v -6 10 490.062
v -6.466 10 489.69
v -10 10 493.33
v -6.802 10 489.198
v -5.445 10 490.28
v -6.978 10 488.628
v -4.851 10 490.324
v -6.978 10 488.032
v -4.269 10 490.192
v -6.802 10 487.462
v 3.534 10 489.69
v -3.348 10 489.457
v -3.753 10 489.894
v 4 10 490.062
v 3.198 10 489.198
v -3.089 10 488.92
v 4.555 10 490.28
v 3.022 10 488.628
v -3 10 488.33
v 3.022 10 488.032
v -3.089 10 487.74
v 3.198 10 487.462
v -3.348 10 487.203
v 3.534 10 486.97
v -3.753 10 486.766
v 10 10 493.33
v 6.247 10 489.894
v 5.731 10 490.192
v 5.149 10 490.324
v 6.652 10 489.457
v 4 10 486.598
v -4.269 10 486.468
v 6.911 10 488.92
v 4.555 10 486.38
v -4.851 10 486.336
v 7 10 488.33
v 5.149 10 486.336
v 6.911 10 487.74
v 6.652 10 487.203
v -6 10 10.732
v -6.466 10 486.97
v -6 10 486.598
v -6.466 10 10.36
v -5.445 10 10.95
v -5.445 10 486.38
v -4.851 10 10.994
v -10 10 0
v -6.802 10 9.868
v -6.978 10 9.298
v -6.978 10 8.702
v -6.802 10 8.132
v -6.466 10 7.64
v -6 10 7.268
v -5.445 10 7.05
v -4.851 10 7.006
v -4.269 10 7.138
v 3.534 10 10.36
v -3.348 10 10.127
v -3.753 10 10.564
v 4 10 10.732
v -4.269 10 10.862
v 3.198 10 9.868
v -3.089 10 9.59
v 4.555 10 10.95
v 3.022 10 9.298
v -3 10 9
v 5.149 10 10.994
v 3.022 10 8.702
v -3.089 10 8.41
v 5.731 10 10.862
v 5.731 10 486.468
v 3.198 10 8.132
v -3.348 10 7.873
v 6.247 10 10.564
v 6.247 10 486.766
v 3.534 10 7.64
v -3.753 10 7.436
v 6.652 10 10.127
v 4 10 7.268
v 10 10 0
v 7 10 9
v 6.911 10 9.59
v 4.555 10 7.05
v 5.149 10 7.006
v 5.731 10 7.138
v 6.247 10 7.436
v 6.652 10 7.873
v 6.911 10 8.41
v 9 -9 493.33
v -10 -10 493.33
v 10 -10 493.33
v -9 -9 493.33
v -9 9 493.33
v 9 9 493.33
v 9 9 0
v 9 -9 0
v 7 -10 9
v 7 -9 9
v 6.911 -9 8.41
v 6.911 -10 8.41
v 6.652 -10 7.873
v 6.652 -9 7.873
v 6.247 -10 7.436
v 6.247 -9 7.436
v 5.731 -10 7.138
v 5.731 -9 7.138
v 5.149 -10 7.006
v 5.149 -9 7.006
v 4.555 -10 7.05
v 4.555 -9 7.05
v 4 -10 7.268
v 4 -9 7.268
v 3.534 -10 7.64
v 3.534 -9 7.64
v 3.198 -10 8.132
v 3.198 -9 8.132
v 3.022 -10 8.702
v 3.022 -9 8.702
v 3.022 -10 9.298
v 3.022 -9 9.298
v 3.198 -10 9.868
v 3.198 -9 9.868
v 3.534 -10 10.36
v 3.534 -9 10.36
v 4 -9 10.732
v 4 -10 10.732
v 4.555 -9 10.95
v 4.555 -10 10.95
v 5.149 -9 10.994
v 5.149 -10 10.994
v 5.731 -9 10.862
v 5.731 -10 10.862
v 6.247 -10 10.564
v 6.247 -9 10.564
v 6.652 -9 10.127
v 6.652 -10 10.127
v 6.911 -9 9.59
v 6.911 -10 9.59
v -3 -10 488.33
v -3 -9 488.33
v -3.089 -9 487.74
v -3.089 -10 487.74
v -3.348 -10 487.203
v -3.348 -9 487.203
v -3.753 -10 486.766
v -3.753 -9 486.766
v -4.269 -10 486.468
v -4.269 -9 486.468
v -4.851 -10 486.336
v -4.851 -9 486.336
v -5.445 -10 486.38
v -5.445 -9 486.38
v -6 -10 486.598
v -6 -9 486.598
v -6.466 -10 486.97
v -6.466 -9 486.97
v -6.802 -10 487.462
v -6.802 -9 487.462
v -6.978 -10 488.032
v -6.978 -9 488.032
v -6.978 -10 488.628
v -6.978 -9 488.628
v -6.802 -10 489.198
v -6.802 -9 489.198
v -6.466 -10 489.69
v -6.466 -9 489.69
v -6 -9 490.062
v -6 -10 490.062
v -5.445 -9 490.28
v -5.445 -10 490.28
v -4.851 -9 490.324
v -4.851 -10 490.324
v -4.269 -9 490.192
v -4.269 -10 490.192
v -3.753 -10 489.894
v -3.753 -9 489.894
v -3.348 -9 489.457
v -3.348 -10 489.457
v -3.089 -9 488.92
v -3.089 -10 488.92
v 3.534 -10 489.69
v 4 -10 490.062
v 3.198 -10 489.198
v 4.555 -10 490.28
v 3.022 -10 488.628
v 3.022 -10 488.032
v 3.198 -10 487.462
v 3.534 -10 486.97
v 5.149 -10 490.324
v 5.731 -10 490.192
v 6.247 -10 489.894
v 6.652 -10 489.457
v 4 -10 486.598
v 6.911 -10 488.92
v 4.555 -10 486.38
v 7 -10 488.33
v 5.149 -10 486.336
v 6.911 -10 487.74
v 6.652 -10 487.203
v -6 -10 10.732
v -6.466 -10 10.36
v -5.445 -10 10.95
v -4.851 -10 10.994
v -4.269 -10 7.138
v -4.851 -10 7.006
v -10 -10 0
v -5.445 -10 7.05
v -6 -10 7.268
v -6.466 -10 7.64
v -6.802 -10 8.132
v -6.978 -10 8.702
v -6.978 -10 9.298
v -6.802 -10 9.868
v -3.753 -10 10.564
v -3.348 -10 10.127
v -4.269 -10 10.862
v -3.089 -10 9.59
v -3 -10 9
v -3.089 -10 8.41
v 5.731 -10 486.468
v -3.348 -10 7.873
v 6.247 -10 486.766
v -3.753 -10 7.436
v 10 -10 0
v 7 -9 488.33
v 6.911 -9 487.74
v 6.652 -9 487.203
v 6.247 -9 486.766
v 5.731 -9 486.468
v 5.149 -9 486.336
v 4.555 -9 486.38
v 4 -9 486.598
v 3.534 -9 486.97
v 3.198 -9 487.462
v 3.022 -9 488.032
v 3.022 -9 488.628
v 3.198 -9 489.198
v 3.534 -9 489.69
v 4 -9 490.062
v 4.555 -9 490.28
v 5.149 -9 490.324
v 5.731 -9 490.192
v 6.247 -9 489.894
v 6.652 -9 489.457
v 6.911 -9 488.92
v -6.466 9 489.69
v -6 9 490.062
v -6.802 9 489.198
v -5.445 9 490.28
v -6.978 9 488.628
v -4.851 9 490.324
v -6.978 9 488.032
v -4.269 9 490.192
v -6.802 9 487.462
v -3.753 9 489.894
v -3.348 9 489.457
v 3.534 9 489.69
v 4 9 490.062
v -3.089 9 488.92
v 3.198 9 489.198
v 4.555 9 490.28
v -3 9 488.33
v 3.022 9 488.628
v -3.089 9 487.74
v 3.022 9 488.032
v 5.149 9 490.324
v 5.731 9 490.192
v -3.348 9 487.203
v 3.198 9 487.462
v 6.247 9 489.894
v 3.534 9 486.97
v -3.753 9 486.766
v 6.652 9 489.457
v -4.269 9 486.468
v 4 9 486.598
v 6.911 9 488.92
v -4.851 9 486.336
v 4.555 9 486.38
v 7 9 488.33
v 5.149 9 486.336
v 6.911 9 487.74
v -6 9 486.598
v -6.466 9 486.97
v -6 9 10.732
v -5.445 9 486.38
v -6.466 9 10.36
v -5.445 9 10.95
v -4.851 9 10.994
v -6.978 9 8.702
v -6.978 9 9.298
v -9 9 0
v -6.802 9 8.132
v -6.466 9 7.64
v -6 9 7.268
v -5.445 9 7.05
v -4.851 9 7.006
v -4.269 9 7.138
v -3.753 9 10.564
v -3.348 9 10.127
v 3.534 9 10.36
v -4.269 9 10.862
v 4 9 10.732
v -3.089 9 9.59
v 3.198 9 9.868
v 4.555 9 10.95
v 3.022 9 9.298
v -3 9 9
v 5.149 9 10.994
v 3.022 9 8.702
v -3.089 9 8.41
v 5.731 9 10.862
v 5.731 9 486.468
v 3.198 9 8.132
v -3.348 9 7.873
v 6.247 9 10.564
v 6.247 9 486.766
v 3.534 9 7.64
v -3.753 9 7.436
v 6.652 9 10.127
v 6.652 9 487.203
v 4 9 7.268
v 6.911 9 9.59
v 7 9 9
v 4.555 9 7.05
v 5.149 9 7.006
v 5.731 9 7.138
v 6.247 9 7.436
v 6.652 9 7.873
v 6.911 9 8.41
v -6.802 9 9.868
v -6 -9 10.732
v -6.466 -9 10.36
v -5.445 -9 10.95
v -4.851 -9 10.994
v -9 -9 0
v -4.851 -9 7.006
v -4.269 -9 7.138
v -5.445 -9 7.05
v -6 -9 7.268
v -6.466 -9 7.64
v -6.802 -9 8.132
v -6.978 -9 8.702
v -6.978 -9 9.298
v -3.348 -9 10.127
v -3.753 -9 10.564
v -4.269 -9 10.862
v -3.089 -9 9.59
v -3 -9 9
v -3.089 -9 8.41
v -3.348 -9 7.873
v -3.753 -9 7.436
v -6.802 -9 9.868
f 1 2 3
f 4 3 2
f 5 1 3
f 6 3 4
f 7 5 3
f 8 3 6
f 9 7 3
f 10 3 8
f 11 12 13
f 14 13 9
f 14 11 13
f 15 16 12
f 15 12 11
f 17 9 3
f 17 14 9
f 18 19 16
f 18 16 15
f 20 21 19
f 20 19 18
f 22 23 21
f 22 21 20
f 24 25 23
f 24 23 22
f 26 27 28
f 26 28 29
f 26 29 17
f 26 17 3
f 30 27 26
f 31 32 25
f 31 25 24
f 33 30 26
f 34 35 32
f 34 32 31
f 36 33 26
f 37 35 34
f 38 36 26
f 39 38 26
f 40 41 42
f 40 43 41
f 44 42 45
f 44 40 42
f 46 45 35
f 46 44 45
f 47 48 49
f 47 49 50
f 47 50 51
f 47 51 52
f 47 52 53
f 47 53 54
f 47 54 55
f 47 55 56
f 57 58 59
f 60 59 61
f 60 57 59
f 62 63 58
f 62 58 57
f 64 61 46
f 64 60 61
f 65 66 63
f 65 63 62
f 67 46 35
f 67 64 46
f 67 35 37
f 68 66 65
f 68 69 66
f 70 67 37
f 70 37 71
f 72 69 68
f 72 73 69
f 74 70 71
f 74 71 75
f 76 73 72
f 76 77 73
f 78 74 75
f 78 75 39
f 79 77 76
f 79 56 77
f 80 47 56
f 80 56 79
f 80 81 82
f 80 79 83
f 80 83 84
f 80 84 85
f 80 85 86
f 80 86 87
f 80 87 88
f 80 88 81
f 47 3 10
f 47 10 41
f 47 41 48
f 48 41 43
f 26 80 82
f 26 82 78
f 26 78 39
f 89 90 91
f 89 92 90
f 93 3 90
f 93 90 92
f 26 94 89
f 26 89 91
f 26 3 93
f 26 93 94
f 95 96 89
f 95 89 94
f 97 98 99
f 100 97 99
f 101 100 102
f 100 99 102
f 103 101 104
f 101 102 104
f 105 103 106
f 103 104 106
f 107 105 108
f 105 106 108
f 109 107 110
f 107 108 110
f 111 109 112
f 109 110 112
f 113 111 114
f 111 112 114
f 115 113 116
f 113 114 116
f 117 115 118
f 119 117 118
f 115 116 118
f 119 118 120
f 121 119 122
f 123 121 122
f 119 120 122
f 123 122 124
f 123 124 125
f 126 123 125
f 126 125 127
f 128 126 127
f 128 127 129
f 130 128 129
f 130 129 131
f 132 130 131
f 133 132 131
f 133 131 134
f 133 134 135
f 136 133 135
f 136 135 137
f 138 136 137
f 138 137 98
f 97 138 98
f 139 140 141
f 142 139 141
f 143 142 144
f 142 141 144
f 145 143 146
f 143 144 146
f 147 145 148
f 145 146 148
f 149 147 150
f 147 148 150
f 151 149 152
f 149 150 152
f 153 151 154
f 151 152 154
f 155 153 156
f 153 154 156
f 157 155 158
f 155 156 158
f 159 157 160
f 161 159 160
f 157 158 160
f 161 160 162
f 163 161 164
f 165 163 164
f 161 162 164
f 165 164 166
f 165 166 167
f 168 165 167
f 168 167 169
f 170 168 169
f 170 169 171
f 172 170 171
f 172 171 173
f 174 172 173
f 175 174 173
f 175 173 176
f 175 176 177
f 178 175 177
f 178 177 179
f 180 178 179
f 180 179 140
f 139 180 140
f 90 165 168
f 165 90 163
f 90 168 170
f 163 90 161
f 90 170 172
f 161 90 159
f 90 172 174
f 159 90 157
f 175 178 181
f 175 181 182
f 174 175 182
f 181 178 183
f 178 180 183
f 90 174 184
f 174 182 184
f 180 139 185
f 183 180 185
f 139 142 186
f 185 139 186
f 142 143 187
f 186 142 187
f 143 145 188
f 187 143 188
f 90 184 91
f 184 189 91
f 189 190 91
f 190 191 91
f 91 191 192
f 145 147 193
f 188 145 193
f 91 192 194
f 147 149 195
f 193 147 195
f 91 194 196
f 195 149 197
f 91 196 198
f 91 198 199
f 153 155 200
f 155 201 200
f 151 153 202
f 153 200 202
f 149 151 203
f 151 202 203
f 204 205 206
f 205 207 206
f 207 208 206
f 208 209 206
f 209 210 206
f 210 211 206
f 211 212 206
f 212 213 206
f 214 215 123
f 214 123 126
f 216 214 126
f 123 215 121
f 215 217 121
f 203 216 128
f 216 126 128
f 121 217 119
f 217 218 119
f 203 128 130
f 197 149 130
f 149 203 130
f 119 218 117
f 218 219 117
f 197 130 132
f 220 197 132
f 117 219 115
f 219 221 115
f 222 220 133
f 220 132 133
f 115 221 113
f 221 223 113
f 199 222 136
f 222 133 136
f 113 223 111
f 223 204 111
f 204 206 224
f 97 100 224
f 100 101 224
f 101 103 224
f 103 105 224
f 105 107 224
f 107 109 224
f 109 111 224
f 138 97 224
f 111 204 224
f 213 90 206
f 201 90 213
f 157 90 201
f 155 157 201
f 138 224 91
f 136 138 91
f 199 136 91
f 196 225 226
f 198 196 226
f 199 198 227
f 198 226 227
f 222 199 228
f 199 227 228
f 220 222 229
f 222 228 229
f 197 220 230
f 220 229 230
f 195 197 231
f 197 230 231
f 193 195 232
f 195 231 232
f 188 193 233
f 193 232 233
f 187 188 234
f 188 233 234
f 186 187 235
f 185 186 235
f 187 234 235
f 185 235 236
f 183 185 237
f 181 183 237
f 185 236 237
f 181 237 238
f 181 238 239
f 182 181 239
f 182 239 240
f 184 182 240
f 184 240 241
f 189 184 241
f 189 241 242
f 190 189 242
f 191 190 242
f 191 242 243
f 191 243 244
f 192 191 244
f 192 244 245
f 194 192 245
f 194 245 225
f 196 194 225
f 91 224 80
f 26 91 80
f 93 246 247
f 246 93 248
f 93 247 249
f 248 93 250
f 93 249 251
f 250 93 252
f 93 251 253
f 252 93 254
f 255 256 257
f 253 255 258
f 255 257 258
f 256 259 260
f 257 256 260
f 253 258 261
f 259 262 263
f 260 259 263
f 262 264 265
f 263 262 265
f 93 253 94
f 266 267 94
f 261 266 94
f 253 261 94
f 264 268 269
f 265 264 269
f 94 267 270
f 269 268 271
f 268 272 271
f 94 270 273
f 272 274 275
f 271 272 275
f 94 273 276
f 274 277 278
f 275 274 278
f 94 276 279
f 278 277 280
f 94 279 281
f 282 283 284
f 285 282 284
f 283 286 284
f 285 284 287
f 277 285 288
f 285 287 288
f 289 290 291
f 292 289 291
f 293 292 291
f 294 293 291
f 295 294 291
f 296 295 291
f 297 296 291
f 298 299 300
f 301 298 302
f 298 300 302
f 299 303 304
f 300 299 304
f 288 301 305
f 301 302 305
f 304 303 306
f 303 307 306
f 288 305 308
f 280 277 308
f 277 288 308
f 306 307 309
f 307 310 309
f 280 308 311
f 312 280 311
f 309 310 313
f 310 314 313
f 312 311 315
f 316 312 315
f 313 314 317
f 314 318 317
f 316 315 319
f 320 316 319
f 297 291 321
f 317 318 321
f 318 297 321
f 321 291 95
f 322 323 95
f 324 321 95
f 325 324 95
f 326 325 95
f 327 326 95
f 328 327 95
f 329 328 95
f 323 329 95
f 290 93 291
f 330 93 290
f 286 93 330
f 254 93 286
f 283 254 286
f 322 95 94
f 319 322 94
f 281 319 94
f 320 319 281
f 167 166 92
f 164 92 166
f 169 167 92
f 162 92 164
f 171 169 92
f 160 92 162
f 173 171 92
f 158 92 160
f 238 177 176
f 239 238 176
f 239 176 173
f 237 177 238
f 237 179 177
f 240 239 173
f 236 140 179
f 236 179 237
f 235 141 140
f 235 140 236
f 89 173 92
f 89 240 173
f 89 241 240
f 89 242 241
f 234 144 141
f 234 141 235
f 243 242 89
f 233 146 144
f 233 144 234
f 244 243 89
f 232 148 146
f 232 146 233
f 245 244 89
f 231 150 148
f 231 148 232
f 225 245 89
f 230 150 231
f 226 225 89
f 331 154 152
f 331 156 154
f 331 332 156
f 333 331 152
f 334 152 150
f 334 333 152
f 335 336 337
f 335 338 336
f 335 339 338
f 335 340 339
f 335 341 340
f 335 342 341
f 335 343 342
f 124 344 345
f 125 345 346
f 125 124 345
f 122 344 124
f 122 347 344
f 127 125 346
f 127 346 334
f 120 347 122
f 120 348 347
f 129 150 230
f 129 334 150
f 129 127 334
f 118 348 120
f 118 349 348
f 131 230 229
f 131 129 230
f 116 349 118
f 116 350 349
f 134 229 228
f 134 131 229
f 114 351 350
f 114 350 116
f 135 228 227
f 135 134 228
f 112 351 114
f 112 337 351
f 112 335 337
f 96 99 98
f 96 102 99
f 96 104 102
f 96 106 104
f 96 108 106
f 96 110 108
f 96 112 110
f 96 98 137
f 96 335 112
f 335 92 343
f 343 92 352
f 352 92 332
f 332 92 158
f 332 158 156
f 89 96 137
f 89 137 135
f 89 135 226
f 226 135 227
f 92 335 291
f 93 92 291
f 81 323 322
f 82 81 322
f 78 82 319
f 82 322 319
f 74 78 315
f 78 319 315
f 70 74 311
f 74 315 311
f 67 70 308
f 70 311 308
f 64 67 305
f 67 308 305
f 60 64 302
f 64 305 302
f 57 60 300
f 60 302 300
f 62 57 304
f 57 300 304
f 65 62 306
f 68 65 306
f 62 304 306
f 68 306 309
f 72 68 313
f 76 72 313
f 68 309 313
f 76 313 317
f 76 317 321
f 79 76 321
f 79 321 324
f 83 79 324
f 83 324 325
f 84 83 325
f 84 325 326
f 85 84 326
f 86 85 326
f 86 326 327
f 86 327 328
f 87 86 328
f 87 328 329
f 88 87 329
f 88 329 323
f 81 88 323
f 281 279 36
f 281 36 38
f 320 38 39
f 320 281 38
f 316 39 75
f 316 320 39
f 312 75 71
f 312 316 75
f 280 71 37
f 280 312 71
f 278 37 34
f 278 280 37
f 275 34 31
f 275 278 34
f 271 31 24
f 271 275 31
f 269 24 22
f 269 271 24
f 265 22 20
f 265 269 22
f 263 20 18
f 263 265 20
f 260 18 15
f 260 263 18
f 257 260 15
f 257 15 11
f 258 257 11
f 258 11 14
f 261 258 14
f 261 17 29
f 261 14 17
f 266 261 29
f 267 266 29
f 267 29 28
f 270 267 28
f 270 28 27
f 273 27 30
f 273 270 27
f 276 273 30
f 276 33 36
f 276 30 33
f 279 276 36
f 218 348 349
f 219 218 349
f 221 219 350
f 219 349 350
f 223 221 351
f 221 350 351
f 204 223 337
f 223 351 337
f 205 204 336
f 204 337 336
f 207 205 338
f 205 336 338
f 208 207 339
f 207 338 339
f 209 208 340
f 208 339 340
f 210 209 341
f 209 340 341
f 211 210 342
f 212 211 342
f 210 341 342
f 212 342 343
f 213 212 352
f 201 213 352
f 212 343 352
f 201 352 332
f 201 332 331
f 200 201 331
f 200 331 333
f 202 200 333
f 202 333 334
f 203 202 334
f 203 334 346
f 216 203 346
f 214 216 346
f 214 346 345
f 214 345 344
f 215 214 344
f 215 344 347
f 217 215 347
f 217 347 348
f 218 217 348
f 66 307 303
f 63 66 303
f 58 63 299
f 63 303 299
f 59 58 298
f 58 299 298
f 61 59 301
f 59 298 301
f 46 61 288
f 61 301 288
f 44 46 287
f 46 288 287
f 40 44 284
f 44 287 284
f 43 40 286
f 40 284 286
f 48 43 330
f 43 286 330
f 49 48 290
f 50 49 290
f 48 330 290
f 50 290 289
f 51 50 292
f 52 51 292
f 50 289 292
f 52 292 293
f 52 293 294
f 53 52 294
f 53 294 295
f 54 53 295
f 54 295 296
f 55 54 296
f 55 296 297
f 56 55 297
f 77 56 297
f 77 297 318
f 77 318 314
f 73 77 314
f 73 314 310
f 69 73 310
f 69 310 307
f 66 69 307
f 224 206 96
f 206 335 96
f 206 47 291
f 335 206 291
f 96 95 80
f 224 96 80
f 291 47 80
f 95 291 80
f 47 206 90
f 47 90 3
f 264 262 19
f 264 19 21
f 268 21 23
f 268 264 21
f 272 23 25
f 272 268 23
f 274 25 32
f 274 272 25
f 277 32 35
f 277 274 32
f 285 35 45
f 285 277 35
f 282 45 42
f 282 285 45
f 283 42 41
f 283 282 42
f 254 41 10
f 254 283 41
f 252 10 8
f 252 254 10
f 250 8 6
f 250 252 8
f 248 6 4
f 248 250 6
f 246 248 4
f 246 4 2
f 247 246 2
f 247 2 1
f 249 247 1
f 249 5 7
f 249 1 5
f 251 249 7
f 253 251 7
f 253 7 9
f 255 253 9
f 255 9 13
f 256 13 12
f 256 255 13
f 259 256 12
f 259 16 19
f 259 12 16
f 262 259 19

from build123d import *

# Parameters (mm, degrees)
SKETCH_1_W                = 20
SKETCH_1_H                = 20
SKETCH_1_W_2              = 18
SKETCH_1_H_2              = 18
EXTRUDE_1_DEPTH           = 493.33
SKETCH_5_R                = 2
CUT_EXTRUDE_12_DEPTH      = 20
CUT_EXTRUDE_13_DEPTH      = 146
CUT_EXTRUDE_13_DEPTH_BACK = 84
SKETCH_6_R                = 2


with BuildPart() as part:
    # 草图1 → 凸台-拉伸1 (new body)
    with BuildSketch(Plane.XY):
        Rectangle(SKETCH_1_W, SKETCH_1_H)
        Rectangle(SKETCH_1_W_2, SKETCH_1_H_2, mode=Mode.SUBTRACT)
    extrude(amount=EXTRUDE_1_DEPTH)

    # 草图5 → 切除-拉伸12 (cut)
    with BuildSketch(Plane.XZ.offset(-9)):
        with Locations((-5, 9)):
            Circle(SKETCH_5_R)
        with Locations((5, 9)):
            Circle(SKETCH_5_R)
    extrude(amount=-CUT_EXTRUDE_12_DEPTH, mode=Mode.SUBTRACT)

    # 草图6 → 切除-拉伸13 (cut, two sides: drawn at the far end of the back side and taken through both)
    with BuildSketch(Plane(origin=(0, -9, 0), x_dir=(1, 0, 0), z_dir=(0, 1, 0)).offset(-CUT_EXTRUDE_13_DEPTH_BACK)):
        with Locations((5, -9)):
            Circle(SKETCH_6_R)
        with Locations((-5, -9)):
            Circle(SKETCH_6_R)
        with Locations((293.56, -9)):
            Circle(SKETCH_6_R)
        with Locations((303.56, -9)):
            Circle(SKETCH_6_R)
        with Locations((15.394157217, -488.33)):
            Circle(SKETCH_6_R)
        with Locations((15.394157217, -478.33)):
            Circle(SKETCH_6_R)
        with Locations((-5, -488.33)):
            Circle(SKETCH_6_R)
        with Locations((5, -488.33)):
            Circle(SKETCH_6_R)
        with Locations((303.56, -488.33)):
            Circle(SKETCH_6_R)
        with Locations((293.56, -488.33)):
            Circle(SKETCH_6_R)
        with Locations((283.56, -488.33)):
            Circle(SKETCH_6_R)
        with Locations((283.56, -478.33)):
            Circle(SKETCH_6_R)
    extrude(amount=CUT_EXTRUDE_13_DEPTH + CUT_EXTRUDE_13_DEPTH_BACK, mode=Mode.SUBTRACT)


solid = part.part
